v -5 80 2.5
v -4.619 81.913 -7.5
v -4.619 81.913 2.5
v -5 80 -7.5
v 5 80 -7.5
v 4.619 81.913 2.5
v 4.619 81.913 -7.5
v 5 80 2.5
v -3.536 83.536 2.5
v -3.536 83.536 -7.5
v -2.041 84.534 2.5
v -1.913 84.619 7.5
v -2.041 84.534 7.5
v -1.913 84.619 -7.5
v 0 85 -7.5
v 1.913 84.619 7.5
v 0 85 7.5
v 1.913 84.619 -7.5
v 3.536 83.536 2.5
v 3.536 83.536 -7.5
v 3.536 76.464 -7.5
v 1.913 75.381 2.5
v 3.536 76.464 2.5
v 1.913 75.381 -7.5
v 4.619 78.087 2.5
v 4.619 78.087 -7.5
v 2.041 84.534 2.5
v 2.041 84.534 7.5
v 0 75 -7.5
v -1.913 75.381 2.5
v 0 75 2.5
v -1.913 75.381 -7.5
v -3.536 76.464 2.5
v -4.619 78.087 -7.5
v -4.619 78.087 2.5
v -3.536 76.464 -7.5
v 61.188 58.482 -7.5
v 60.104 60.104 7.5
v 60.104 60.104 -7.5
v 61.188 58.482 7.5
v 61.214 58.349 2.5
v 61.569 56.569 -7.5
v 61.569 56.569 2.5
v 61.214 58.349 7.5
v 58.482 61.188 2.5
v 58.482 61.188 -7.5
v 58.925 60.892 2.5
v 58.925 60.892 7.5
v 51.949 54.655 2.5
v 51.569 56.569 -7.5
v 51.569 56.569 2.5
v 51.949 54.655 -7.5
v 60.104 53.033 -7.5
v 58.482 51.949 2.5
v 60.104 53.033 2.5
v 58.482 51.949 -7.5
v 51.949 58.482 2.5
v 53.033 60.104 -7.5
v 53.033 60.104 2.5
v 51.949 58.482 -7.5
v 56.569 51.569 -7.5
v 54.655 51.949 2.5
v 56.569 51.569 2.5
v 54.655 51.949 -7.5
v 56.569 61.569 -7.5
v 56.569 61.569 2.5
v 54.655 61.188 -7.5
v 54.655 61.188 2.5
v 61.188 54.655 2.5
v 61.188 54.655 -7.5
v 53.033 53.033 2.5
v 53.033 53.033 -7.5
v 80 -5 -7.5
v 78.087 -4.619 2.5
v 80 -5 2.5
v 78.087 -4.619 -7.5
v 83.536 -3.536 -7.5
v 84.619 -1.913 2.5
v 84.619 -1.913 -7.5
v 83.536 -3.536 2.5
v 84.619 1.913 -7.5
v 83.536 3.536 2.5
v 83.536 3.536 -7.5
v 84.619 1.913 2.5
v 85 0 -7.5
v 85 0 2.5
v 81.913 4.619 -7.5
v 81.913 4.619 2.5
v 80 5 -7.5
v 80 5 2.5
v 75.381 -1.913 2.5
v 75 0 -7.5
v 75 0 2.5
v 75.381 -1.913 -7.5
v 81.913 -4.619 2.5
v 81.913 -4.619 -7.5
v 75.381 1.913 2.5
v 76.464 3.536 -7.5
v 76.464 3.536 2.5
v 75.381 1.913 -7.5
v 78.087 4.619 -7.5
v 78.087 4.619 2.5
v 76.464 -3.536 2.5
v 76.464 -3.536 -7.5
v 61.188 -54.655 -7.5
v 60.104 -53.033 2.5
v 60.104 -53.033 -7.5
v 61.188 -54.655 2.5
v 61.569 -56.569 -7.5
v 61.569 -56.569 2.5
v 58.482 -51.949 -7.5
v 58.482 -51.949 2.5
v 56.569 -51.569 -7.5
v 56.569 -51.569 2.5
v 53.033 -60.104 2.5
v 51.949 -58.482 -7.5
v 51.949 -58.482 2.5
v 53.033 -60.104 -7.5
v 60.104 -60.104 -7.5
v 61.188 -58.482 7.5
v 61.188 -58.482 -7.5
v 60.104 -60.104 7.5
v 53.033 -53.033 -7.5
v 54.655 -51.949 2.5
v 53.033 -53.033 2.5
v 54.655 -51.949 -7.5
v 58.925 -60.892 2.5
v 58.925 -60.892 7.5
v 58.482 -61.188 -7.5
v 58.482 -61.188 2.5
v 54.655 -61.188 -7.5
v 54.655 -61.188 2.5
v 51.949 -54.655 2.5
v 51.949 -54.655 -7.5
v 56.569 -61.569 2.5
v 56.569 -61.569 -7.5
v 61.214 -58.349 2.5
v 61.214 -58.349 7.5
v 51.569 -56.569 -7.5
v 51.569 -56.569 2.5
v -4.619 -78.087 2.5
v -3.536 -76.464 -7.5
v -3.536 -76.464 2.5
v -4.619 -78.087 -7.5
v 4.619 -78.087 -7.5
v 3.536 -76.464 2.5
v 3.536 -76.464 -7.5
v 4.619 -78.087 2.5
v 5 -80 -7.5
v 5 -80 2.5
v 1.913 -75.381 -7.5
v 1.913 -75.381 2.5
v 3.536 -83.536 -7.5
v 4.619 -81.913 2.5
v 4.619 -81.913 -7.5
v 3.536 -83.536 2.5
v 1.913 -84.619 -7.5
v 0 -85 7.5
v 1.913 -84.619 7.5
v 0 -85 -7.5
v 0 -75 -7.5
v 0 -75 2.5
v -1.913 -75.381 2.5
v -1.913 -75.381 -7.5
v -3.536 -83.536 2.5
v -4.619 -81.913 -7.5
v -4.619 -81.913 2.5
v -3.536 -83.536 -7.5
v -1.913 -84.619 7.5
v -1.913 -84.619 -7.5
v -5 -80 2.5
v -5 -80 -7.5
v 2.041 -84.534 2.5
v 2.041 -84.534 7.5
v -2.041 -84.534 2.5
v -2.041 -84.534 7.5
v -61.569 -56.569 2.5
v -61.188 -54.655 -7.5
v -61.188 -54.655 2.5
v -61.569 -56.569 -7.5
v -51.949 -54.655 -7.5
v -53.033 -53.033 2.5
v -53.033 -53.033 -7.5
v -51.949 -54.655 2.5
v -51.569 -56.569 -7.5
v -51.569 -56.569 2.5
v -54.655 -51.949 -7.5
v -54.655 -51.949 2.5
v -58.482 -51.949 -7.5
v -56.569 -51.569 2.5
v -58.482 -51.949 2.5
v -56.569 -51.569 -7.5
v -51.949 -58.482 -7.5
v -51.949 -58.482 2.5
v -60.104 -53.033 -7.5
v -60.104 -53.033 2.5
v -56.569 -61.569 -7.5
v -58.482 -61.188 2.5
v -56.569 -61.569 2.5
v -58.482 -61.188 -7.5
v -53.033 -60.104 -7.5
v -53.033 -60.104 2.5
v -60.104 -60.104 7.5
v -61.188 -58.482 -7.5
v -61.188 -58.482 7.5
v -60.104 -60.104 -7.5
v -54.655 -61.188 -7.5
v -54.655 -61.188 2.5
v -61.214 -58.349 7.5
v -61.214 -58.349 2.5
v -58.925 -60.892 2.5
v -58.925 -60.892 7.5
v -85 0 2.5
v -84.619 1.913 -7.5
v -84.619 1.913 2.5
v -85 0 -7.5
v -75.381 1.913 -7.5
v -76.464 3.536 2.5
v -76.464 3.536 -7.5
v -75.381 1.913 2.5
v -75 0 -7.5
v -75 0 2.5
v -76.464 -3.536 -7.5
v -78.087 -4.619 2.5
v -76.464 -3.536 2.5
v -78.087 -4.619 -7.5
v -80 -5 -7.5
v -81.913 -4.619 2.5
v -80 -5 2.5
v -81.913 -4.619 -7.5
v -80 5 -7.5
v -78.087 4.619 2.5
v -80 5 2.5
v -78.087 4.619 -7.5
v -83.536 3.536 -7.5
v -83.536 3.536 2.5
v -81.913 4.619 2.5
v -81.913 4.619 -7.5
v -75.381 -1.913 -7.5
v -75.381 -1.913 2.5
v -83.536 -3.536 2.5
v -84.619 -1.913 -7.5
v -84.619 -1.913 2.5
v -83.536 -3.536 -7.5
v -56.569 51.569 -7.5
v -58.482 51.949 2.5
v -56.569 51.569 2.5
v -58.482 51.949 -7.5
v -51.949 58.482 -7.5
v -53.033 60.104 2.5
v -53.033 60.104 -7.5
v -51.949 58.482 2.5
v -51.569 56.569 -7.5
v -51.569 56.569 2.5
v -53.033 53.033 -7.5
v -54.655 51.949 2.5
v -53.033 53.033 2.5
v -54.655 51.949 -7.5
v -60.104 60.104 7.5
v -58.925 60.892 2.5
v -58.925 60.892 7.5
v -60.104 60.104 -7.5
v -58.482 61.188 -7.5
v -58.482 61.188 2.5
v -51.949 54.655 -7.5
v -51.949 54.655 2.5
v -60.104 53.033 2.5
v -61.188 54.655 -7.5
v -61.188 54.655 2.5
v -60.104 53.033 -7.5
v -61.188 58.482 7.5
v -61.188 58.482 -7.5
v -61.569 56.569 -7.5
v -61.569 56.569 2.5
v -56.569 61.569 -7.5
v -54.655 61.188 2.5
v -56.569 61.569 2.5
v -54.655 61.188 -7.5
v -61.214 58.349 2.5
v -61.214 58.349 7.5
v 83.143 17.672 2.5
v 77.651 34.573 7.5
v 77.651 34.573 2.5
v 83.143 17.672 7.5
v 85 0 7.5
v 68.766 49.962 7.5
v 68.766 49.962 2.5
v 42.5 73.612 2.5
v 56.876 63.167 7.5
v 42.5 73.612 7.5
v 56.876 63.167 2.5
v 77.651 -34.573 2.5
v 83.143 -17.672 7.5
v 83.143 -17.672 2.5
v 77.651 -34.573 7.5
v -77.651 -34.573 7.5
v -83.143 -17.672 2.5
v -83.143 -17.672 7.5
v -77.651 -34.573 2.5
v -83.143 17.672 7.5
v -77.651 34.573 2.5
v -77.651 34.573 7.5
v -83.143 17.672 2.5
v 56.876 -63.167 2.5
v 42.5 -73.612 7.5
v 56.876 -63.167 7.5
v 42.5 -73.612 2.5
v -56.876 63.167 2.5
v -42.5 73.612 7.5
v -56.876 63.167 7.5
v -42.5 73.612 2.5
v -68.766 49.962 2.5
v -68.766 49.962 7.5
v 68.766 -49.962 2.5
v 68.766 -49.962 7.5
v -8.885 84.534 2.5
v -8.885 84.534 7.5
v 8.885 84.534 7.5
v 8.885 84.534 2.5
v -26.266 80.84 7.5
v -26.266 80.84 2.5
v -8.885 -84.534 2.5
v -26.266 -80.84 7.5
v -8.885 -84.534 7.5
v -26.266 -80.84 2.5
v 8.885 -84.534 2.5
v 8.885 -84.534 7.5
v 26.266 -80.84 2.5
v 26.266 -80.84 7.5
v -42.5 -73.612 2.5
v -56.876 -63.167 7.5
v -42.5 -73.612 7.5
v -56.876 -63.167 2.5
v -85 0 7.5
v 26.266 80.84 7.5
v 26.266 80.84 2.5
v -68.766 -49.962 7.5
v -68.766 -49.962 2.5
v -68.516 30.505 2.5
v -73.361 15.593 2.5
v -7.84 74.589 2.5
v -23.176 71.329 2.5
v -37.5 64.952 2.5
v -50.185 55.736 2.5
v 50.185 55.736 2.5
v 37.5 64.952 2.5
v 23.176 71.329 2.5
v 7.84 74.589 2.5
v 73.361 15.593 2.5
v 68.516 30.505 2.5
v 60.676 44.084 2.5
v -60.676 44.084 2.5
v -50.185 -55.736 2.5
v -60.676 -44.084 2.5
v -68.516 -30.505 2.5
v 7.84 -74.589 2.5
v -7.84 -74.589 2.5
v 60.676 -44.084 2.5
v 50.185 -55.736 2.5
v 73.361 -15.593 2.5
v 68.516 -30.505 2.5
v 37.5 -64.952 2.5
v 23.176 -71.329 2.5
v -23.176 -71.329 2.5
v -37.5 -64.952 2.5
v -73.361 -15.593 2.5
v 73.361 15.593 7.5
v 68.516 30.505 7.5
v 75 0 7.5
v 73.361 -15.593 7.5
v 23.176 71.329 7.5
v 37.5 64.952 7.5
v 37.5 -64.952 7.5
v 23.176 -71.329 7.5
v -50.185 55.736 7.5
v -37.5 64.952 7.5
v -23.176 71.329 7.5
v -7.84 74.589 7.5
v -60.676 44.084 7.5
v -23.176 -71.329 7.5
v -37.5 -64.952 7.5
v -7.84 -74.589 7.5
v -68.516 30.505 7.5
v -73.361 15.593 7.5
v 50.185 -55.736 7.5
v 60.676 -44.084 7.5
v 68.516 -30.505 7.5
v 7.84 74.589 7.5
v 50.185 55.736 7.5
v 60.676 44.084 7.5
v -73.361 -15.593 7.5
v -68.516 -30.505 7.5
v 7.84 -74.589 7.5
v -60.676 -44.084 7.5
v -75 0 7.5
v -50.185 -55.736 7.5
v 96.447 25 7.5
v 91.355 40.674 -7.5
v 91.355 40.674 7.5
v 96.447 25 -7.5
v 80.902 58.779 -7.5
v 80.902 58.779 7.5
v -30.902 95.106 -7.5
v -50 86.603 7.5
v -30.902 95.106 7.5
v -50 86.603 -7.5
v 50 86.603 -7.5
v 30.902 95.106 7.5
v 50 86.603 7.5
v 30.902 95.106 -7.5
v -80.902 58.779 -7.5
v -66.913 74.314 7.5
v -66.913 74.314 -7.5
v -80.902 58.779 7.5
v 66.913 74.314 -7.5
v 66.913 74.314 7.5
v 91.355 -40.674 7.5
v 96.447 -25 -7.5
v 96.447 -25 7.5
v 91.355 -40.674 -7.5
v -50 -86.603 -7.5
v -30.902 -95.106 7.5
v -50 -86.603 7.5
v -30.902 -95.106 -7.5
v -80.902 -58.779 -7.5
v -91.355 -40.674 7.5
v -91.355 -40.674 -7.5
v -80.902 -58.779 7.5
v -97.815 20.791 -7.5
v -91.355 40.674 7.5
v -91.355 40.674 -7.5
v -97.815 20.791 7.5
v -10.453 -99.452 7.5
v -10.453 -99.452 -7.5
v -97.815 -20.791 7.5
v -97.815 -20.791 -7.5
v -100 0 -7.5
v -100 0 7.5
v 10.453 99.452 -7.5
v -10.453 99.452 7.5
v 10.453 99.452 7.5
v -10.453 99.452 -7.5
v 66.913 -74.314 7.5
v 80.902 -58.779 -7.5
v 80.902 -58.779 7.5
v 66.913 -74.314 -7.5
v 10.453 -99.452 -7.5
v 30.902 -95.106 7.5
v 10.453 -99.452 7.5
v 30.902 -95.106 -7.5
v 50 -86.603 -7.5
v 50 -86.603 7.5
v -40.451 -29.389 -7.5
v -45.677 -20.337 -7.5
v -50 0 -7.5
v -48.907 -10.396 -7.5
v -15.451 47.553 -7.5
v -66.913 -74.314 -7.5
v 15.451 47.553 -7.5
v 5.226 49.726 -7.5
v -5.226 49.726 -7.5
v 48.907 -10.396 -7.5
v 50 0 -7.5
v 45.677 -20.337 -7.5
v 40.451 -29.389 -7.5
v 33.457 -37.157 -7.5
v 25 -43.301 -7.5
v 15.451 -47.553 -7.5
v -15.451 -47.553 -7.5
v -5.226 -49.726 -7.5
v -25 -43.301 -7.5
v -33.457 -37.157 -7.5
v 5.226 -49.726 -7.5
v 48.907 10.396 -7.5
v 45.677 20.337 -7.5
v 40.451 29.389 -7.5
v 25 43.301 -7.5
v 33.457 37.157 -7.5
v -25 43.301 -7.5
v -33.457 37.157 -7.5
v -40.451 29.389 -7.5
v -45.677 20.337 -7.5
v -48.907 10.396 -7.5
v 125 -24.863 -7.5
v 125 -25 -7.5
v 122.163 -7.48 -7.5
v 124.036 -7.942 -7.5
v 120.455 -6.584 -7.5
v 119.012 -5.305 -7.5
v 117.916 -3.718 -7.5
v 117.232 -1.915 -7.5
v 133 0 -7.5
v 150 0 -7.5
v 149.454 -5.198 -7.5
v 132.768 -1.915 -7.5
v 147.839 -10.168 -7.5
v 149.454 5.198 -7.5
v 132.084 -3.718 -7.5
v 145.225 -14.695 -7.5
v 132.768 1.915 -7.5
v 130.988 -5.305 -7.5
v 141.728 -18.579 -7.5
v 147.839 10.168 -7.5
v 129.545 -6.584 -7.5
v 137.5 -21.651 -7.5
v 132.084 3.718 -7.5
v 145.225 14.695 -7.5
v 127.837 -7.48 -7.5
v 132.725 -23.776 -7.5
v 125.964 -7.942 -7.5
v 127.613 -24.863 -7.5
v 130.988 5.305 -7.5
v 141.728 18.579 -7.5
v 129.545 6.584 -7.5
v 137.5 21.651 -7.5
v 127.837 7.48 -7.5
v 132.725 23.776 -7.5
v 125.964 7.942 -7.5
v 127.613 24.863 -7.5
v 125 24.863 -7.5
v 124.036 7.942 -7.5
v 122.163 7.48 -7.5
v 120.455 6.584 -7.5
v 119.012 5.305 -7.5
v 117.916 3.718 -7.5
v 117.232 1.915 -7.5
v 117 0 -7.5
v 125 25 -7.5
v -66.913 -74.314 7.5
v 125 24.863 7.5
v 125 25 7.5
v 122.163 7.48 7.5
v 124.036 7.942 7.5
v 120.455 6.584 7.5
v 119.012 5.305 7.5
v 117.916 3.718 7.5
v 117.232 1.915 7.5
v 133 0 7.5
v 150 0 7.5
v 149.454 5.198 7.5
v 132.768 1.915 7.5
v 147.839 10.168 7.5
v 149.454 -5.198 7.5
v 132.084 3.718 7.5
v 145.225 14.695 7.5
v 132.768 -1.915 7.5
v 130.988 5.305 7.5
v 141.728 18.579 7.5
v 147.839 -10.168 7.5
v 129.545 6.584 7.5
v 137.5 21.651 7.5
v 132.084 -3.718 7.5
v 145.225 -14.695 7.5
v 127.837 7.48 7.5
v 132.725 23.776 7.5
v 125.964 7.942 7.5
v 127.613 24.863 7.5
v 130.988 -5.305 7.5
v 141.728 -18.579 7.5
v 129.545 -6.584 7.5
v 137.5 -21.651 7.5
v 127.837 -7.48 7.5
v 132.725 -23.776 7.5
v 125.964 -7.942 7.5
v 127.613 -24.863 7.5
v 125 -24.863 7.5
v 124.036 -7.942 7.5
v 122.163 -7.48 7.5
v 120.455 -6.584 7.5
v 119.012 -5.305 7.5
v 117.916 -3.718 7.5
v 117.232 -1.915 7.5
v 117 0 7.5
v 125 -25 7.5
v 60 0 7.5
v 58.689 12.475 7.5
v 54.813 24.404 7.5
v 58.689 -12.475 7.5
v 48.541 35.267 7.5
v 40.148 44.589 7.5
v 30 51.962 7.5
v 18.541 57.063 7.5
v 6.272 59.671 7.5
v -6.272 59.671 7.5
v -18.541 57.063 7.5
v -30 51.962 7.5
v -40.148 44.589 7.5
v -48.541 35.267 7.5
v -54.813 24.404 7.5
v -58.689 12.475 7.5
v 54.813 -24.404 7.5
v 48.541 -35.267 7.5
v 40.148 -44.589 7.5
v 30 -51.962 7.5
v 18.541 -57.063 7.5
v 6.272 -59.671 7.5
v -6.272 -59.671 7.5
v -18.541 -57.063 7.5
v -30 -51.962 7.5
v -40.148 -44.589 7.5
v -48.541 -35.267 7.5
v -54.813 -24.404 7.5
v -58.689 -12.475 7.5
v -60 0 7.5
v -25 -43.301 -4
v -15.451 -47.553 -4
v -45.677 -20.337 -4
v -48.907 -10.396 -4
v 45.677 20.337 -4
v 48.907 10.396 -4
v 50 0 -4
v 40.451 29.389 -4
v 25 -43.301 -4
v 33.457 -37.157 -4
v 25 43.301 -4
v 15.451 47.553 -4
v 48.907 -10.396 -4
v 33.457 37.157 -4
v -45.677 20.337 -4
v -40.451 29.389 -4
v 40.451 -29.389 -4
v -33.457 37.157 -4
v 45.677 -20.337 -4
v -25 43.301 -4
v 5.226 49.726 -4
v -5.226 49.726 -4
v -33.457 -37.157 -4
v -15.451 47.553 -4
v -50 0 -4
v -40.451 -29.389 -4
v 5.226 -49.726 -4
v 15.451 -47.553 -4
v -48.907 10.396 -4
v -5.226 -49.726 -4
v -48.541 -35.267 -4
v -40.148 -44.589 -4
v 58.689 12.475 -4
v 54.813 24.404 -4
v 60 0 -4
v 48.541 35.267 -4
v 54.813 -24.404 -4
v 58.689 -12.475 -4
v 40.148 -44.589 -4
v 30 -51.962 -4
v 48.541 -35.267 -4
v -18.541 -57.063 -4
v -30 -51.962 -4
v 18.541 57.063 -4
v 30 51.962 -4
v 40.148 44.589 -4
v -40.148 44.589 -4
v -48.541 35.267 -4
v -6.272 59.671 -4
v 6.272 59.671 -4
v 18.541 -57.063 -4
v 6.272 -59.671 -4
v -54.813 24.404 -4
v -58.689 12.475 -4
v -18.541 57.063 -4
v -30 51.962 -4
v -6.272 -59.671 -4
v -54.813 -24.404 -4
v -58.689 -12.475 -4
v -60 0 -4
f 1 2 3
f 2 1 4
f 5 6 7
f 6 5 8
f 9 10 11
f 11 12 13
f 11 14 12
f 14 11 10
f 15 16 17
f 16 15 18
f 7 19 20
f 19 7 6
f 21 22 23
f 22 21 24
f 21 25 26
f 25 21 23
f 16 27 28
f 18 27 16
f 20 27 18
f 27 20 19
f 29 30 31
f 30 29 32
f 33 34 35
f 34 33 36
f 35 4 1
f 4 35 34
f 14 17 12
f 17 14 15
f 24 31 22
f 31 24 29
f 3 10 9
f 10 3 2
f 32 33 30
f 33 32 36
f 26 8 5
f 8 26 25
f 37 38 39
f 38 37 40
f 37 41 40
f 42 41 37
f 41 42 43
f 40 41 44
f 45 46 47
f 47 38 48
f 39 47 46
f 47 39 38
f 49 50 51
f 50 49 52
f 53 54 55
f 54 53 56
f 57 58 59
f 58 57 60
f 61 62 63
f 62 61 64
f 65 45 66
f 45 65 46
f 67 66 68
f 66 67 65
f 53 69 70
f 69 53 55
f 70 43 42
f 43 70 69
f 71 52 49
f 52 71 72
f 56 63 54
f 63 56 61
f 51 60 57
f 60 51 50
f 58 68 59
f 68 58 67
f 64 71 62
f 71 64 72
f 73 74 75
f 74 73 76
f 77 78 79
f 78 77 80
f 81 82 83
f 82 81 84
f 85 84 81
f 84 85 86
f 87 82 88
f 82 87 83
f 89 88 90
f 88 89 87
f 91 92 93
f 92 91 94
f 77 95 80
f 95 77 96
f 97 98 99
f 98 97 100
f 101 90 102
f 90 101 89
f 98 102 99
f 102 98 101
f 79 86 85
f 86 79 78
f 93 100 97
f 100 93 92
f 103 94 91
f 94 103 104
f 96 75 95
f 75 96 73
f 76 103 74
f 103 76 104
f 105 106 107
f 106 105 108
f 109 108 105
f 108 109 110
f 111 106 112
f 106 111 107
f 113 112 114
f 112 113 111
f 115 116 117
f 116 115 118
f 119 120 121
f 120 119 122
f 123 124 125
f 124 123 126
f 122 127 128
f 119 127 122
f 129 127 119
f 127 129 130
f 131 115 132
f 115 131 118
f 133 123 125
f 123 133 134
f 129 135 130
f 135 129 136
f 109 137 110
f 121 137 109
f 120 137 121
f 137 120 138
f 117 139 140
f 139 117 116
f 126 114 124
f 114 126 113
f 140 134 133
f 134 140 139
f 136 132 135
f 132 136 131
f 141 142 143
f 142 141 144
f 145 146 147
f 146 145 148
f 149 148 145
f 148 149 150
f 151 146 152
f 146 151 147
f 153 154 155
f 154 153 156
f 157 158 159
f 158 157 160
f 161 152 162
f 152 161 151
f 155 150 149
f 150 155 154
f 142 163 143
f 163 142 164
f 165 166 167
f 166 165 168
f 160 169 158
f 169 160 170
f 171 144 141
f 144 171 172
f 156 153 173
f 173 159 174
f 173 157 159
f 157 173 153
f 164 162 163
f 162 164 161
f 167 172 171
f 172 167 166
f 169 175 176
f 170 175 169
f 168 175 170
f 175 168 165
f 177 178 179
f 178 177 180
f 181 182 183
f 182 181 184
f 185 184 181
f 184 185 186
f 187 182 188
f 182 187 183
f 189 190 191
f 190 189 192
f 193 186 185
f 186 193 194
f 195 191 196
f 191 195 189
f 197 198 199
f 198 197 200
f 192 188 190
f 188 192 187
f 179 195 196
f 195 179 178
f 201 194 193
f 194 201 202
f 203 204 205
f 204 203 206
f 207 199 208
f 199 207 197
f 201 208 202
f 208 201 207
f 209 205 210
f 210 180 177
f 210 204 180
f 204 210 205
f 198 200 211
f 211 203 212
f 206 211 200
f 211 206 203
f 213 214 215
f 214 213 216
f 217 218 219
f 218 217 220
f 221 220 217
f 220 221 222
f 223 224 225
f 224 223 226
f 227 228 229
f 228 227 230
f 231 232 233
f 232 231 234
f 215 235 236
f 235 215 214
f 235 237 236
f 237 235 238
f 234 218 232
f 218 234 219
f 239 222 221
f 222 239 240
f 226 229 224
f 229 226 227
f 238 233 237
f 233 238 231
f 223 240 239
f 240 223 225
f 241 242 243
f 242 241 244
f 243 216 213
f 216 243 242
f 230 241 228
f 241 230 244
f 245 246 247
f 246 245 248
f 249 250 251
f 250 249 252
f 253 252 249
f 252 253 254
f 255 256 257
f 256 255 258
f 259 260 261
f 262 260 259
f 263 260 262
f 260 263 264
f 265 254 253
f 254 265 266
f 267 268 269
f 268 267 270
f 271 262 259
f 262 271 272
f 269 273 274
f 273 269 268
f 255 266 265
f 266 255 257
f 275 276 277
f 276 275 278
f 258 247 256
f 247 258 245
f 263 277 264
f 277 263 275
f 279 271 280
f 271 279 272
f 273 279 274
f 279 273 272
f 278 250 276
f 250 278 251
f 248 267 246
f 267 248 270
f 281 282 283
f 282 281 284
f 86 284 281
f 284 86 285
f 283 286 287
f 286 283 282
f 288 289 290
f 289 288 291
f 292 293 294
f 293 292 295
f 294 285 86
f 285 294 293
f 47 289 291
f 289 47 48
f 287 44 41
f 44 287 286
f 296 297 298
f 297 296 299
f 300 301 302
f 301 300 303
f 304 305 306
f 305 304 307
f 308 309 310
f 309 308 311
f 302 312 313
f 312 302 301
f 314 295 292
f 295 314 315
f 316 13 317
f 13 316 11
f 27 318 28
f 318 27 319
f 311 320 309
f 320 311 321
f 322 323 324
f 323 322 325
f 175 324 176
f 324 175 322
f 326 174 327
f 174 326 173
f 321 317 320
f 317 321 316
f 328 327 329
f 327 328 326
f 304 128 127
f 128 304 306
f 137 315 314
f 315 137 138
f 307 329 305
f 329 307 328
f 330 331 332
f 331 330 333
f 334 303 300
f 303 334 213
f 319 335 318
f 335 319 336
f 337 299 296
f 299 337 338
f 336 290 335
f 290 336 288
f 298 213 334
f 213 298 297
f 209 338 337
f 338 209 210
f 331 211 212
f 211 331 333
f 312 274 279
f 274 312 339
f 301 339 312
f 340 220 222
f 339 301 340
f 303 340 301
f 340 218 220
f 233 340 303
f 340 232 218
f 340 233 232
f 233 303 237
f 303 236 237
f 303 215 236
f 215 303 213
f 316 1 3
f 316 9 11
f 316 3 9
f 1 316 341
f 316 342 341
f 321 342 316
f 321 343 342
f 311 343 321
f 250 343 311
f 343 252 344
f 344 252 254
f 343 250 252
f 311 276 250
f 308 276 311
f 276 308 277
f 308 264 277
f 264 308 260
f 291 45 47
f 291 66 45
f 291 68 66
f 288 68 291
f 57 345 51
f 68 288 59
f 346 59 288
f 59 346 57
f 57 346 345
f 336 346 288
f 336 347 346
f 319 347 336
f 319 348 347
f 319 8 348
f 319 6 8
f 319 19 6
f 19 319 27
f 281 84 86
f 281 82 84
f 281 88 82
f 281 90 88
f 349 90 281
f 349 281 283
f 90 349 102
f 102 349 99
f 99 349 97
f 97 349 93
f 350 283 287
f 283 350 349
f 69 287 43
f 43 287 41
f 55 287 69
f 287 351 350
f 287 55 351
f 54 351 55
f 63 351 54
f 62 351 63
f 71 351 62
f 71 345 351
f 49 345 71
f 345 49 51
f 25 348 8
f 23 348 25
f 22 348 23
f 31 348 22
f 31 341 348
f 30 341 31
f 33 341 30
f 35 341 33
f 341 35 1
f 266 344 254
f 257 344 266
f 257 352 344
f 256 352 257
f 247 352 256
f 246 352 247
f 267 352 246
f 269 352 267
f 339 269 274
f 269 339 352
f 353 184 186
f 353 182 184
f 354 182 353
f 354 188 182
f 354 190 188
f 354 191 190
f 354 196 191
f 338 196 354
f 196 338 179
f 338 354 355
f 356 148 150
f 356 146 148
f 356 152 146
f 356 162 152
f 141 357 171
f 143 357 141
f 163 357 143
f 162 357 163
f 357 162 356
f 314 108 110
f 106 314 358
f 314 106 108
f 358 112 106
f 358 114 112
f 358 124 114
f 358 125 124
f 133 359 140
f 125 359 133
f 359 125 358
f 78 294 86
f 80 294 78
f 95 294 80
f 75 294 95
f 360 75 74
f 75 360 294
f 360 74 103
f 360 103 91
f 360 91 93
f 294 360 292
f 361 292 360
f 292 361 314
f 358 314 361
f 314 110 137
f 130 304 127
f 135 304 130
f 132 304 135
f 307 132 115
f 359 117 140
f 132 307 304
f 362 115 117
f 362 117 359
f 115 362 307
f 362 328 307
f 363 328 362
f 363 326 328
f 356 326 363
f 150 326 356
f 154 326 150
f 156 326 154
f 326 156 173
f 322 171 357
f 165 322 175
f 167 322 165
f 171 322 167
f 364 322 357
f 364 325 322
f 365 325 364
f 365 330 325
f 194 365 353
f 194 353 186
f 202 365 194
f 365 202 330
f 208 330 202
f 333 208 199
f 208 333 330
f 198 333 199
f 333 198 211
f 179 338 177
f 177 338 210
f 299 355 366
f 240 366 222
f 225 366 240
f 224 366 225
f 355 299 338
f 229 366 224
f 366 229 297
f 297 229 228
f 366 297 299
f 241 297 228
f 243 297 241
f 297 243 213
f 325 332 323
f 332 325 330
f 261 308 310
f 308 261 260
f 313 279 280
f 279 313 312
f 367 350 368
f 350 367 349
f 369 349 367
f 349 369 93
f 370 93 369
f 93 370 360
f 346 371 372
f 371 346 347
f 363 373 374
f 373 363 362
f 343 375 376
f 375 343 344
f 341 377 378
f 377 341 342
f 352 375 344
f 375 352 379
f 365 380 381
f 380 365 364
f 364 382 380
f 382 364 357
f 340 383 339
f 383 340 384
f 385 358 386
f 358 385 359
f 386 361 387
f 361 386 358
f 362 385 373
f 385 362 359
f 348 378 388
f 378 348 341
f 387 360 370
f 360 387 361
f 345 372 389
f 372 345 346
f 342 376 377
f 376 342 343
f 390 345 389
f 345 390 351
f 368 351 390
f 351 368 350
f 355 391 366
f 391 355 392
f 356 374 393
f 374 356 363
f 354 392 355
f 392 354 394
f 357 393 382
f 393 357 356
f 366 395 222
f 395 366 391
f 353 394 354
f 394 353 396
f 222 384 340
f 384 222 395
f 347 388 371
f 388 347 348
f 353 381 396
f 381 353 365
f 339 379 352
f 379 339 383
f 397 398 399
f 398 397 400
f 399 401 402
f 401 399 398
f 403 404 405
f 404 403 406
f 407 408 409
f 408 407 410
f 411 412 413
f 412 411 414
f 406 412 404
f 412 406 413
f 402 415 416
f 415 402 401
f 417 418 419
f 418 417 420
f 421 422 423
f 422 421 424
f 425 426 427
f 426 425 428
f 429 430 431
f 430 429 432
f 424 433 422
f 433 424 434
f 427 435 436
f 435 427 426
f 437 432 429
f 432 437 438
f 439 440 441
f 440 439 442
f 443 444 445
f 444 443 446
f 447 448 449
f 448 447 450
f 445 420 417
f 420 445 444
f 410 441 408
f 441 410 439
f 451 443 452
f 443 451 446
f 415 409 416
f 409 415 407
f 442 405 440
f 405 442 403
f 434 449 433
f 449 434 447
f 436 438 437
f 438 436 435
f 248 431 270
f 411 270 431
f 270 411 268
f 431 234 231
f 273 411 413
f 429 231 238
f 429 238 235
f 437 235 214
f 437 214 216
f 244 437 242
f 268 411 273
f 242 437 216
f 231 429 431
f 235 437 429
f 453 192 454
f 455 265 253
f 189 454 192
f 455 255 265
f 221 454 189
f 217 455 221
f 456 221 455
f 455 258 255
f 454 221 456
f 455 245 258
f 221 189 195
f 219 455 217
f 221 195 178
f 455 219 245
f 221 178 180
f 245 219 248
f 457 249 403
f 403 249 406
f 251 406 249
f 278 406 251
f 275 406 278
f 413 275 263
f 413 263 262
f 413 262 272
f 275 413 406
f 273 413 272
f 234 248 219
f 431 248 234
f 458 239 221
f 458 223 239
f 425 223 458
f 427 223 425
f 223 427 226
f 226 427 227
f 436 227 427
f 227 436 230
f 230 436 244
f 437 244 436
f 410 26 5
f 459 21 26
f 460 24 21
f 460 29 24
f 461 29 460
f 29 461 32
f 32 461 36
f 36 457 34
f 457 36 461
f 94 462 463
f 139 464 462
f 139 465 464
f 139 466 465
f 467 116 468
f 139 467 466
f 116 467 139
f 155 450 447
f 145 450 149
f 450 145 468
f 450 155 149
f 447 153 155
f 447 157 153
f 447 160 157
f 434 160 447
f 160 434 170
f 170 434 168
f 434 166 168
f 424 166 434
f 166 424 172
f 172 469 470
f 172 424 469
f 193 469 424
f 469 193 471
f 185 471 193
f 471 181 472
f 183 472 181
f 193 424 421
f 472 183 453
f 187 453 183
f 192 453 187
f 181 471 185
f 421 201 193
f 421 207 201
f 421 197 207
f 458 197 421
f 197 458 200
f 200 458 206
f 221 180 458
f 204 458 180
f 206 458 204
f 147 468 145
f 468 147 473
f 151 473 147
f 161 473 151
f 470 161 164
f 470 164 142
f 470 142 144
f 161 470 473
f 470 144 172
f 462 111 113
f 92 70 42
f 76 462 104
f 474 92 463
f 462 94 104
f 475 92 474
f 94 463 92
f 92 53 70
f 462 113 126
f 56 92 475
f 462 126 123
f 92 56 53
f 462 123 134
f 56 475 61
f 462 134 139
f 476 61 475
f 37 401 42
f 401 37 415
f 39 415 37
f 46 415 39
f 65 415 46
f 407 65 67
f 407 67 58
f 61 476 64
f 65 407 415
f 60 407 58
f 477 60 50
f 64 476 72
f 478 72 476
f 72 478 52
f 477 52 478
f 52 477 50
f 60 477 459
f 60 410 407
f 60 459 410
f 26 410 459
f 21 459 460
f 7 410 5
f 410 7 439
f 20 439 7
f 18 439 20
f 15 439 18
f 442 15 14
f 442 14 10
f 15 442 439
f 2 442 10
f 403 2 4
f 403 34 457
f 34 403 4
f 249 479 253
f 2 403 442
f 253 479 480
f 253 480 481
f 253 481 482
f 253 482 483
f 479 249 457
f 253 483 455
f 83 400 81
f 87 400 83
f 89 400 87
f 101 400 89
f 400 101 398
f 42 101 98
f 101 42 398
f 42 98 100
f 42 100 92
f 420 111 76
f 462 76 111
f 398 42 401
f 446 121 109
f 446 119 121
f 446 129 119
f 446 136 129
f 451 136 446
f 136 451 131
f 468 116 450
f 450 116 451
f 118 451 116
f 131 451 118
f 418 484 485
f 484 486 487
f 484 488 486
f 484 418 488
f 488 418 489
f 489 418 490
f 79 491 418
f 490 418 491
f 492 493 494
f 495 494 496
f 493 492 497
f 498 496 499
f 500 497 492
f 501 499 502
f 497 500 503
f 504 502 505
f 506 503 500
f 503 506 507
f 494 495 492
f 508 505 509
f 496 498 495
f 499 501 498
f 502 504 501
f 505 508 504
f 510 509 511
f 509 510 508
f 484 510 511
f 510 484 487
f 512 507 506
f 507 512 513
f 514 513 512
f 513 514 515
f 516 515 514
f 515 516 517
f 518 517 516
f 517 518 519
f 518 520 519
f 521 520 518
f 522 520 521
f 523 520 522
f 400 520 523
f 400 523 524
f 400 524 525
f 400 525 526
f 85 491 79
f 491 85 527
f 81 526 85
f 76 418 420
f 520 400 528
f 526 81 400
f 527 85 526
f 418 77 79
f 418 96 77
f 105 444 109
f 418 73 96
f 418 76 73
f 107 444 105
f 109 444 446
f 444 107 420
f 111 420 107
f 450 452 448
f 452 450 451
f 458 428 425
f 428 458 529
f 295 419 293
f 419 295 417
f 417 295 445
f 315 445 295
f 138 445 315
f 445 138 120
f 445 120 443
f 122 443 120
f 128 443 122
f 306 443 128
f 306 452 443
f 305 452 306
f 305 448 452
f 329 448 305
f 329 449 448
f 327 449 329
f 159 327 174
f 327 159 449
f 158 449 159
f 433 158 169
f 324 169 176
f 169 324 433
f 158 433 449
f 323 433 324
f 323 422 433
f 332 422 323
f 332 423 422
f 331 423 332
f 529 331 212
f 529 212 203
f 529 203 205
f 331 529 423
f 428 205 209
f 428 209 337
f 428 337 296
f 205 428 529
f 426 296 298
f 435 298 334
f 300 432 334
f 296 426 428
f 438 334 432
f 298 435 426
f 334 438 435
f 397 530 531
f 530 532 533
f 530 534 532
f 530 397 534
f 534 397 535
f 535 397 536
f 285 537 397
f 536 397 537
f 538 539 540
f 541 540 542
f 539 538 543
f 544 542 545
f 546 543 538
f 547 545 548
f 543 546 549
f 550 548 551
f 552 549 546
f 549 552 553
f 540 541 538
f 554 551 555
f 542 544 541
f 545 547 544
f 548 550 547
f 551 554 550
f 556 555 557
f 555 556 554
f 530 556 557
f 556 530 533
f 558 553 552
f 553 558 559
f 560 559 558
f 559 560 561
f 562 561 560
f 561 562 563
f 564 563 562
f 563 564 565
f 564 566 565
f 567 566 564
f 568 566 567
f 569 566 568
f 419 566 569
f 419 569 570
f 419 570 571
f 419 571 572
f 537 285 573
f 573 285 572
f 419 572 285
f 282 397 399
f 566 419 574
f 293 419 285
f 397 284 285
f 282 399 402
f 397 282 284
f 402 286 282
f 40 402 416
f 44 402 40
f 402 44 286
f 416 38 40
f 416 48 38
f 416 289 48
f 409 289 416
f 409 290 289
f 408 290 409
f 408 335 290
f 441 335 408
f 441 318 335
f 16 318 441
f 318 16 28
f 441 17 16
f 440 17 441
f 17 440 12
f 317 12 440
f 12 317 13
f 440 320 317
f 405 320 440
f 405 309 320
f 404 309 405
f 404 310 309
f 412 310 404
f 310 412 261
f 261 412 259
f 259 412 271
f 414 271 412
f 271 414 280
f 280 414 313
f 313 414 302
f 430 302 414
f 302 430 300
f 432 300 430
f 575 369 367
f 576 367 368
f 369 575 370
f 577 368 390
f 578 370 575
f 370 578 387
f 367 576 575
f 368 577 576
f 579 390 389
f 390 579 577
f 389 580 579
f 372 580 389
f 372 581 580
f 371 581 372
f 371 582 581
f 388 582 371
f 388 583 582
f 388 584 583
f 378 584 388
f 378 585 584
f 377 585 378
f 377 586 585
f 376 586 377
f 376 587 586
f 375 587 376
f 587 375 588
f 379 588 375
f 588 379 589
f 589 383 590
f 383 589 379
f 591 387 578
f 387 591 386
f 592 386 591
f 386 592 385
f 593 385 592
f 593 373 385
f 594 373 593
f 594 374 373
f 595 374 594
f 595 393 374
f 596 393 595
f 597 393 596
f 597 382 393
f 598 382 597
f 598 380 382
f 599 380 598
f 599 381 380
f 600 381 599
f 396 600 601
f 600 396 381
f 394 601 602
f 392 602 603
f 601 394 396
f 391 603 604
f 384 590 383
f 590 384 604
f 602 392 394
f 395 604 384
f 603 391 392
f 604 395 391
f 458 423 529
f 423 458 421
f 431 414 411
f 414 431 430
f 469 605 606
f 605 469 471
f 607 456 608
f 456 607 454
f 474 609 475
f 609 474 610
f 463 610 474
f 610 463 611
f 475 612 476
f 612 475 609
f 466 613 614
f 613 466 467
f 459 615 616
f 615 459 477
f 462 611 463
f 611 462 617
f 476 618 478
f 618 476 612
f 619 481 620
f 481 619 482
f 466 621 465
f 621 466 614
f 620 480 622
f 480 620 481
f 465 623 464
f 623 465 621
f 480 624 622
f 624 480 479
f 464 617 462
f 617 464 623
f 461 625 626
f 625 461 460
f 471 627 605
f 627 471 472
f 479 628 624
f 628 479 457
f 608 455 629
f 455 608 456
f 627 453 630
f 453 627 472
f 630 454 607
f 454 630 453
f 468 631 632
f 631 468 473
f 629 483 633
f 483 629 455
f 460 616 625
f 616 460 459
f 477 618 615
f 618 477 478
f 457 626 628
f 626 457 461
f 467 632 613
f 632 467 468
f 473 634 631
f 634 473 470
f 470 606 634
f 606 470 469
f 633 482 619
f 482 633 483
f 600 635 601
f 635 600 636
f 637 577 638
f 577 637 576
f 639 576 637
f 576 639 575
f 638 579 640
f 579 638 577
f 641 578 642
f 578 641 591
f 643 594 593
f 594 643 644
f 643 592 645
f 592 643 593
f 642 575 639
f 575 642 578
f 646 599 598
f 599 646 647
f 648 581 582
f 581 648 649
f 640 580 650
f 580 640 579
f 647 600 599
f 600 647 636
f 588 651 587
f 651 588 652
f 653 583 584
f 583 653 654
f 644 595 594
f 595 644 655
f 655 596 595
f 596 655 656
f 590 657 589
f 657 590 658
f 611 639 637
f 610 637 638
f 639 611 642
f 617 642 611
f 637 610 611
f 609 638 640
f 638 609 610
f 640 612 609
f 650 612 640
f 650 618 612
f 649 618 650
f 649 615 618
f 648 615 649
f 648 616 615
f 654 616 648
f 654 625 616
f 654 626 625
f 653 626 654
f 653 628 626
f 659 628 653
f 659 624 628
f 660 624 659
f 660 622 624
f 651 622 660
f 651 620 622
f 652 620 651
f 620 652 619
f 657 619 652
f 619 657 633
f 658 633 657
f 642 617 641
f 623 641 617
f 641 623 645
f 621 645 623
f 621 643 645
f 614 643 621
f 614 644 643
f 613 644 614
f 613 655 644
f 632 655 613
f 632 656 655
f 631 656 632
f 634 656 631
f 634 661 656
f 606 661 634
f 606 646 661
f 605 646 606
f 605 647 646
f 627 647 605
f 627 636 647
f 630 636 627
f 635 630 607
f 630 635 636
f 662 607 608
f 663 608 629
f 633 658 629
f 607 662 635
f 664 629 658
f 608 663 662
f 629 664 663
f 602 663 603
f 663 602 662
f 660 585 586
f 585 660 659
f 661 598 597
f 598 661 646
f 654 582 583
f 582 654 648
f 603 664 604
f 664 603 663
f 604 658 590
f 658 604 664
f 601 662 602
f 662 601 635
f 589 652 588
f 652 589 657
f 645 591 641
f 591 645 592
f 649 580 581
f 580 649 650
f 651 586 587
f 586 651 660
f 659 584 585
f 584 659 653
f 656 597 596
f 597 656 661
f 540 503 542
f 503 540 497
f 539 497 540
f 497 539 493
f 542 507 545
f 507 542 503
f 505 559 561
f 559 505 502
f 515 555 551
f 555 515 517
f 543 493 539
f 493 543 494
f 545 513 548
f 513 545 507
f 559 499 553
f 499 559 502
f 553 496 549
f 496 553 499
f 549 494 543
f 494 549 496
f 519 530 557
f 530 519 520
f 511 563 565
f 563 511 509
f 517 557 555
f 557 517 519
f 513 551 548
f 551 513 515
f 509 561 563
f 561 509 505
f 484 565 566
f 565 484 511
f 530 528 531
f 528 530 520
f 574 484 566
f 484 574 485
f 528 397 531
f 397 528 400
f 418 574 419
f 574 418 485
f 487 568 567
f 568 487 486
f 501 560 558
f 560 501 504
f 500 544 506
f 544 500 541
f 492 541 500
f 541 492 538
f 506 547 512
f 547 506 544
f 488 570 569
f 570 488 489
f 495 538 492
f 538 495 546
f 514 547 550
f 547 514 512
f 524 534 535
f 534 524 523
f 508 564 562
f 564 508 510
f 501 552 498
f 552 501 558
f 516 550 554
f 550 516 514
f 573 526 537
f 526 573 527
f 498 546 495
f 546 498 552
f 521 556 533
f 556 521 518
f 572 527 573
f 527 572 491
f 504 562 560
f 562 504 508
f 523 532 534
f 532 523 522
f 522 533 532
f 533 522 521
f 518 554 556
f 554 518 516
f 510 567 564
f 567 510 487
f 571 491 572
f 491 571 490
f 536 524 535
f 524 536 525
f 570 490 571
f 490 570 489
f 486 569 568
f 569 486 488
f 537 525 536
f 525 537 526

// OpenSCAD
module Light()
{
	radius = 50;
	lights = 8;
	thickness = 15;
	handle = radius/2;
	union() {
	difference() {
		cylinder(h = thickness, r=radius*2, center=true);
		cylinder(h = thickness*1.2, r=radius, center=true);
		translate([0,0,thickness / 3]) cylinder(h = thickness*1.2, r=radius*1.2, center=true);
		for ( i = [0 : 360/lights : 359] )
			translate([sin(i)*radius*1.6,cos(i)*radius*1.6,0])
				cylinder(h = thickness*1.2, r=5, center=true);
		
		translate([0,0,thickness*2/3]) 
		difference() {
			cylinder(h = thickness, r=(radius*1.6)+5, center=true);
			cylinder(h = thickness*1.6, r=(radius*1.6)-5, center=true);
		}
	}
	translate([radius*2.5,0,0])
		difference() {
			union() {
			cylinder(h = thickness, r=handle, center=true);
			translate([-handle*1.5,-handle,-thickness/2]) cube([handle*1.5,handle*2,thickness], centre=true);
			}
			cylinder(h = thickness*1.2, r=8, center=true);
		}
	}
}

Light();
